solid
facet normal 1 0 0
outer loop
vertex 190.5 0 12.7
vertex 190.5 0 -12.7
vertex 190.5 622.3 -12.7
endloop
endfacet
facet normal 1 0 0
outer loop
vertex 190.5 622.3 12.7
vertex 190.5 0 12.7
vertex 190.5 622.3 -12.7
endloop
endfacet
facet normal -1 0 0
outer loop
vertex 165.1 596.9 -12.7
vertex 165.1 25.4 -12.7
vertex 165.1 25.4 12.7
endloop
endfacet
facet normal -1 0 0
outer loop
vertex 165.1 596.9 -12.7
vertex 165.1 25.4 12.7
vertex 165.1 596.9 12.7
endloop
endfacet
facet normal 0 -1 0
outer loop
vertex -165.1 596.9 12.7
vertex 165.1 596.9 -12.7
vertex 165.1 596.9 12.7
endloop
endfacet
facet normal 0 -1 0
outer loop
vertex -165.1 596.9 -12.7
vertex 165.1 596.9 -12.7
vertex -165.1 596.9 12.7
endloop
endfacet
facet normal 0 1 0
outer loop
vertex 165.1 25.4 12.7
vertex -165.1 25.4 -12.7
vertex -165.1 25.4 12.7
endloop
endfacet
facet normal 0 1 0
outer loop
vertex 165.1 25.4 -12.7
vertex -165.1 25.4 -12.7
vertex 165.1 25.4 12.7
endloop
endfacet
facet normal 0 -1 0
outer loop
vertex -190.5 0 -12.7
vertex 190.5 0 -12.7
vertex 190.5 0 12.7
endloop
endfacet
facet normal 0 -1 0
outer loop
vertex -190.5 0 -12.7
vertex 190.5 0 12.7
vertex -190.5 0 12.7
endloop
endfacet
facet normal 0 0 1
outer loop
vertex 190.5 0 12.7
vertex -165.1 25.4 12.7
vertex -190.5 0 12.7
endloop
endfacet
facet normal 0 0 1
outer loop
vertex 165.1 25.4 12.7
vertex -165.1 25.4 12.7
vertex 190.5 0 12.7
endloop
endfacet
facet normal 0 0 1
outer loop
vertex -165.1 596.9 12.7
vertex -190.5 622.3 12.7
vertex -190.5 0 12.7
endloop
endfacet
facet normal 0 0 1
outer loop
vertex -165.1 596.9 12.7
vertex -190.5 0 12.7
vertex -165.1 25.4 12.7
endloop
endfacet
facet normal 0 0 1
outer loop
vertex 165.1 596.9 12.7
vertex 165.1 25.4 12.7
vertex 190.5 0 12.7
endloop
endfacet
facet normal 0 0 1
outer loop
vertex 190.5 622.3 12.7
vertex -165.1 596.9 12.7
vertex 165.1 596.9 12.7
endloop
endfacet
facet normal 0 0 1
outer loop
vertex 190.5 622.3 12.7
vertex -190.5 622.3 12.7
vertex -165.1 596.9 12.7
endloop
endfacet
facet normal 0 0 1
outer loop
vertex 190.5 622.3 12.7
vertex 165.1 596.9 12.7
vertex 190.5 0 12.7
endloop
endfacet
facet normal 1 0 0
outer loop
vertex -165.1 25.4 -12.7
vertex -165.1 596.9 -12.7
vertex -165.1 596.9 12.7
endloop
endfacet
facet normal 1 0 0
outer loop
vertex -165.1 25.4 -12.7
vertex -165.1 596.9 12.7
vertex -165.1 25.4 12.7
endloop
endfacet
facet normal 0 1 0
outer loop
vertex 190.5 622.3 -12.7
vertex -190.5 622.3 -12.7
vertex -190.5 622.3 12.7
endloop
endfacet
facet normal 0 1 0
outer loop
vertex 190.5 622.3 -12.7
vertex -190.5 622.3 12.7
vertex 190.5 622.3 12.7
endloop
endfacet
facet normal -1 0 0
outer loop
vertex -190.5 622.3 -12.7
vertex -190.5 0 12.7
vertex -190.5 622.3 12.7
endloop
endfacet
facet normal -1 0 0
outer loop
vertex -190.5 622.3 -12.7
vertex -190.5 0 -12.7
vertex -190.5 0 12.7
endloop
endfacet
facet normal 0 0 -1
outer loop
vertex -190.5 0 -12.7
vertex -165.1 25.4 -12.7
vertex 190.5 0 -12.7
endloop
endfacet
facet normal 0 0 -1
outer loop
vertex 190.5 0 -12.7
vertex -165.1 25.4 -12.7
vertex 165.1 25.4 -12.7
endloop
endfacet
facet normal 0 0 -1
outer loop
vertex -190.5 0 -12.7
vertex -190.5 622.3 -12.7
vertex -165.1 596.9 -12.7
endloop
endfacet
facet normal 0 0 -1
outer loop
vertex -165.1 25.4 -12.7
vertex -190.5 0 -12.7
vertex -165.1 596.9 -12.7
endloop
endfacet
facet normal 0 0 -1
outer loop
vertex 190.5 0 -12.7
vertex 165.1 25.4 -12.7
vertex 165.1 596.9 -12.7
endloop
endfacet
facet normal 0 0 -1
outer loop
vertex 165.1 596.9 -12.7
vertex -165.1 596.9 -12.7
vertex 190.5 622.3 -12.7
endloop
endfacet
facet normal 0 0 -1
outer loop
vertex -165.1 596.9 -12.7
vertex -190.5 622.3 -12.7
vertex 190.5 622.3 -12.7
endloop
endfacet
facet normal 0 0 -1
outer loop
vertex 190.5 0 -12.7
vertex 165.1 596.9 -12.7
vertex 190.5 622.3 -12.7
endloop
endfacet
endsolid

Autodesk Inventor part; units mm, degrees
ref_plane "YZ Plane" through (0, 0, 0) normal (1, 0, 0) x (0, 1, 0)
ref_plane "XZ Plane" through (0, 0, 0) normal (0, 1, 0) x (-1, 0, 0)
ref_plane "XY Plane" through (0, 0, 0) normal (0, 0, 1) x (1, 0, 0)
sketch "Sketch1" plane through (0, 0, 0) normal (0, 0, 1) x (1, 0, 0)
  line L0 (0, 0) -> (190.5, 0)
  line L1 (190.5, 0) -> (190.5, 622.3)
  line L2 (190.5, 622.3) -> (0, 622.3)
  line L3 (0, 0) -> (0, 622.3) construction
  line L4 (0, 0) -> (-190.5, 0)
  line L5 (-190.5, 0) -> (-190.5, 622.3)
  line L6 (-190.5, 622.3) -> (0, 622.3)
  line L7 (-165.1, 25.4) -> (165.1, 25.4)
  line L8 (165.1, 25.4) -> (165.1, 596.9)
  line L9 (165.1, 596.9) -> (-165.1, 596.9)
  line L10 (-165.1, 596.9) -> (-165.1, 25.4)
  dimension "d1" = 622.3
  dimension "d2" = 381
  dimension "d3" = 25.4
  dimension "d4" = 25.4
  dimension "d5" = 25.4
  dimension "d6" = 25.4
extrude "Extrusion1" add sketch "Sketch1" along normal mid plane 25.4
properties part number "primativeBaseForShortRobot"
